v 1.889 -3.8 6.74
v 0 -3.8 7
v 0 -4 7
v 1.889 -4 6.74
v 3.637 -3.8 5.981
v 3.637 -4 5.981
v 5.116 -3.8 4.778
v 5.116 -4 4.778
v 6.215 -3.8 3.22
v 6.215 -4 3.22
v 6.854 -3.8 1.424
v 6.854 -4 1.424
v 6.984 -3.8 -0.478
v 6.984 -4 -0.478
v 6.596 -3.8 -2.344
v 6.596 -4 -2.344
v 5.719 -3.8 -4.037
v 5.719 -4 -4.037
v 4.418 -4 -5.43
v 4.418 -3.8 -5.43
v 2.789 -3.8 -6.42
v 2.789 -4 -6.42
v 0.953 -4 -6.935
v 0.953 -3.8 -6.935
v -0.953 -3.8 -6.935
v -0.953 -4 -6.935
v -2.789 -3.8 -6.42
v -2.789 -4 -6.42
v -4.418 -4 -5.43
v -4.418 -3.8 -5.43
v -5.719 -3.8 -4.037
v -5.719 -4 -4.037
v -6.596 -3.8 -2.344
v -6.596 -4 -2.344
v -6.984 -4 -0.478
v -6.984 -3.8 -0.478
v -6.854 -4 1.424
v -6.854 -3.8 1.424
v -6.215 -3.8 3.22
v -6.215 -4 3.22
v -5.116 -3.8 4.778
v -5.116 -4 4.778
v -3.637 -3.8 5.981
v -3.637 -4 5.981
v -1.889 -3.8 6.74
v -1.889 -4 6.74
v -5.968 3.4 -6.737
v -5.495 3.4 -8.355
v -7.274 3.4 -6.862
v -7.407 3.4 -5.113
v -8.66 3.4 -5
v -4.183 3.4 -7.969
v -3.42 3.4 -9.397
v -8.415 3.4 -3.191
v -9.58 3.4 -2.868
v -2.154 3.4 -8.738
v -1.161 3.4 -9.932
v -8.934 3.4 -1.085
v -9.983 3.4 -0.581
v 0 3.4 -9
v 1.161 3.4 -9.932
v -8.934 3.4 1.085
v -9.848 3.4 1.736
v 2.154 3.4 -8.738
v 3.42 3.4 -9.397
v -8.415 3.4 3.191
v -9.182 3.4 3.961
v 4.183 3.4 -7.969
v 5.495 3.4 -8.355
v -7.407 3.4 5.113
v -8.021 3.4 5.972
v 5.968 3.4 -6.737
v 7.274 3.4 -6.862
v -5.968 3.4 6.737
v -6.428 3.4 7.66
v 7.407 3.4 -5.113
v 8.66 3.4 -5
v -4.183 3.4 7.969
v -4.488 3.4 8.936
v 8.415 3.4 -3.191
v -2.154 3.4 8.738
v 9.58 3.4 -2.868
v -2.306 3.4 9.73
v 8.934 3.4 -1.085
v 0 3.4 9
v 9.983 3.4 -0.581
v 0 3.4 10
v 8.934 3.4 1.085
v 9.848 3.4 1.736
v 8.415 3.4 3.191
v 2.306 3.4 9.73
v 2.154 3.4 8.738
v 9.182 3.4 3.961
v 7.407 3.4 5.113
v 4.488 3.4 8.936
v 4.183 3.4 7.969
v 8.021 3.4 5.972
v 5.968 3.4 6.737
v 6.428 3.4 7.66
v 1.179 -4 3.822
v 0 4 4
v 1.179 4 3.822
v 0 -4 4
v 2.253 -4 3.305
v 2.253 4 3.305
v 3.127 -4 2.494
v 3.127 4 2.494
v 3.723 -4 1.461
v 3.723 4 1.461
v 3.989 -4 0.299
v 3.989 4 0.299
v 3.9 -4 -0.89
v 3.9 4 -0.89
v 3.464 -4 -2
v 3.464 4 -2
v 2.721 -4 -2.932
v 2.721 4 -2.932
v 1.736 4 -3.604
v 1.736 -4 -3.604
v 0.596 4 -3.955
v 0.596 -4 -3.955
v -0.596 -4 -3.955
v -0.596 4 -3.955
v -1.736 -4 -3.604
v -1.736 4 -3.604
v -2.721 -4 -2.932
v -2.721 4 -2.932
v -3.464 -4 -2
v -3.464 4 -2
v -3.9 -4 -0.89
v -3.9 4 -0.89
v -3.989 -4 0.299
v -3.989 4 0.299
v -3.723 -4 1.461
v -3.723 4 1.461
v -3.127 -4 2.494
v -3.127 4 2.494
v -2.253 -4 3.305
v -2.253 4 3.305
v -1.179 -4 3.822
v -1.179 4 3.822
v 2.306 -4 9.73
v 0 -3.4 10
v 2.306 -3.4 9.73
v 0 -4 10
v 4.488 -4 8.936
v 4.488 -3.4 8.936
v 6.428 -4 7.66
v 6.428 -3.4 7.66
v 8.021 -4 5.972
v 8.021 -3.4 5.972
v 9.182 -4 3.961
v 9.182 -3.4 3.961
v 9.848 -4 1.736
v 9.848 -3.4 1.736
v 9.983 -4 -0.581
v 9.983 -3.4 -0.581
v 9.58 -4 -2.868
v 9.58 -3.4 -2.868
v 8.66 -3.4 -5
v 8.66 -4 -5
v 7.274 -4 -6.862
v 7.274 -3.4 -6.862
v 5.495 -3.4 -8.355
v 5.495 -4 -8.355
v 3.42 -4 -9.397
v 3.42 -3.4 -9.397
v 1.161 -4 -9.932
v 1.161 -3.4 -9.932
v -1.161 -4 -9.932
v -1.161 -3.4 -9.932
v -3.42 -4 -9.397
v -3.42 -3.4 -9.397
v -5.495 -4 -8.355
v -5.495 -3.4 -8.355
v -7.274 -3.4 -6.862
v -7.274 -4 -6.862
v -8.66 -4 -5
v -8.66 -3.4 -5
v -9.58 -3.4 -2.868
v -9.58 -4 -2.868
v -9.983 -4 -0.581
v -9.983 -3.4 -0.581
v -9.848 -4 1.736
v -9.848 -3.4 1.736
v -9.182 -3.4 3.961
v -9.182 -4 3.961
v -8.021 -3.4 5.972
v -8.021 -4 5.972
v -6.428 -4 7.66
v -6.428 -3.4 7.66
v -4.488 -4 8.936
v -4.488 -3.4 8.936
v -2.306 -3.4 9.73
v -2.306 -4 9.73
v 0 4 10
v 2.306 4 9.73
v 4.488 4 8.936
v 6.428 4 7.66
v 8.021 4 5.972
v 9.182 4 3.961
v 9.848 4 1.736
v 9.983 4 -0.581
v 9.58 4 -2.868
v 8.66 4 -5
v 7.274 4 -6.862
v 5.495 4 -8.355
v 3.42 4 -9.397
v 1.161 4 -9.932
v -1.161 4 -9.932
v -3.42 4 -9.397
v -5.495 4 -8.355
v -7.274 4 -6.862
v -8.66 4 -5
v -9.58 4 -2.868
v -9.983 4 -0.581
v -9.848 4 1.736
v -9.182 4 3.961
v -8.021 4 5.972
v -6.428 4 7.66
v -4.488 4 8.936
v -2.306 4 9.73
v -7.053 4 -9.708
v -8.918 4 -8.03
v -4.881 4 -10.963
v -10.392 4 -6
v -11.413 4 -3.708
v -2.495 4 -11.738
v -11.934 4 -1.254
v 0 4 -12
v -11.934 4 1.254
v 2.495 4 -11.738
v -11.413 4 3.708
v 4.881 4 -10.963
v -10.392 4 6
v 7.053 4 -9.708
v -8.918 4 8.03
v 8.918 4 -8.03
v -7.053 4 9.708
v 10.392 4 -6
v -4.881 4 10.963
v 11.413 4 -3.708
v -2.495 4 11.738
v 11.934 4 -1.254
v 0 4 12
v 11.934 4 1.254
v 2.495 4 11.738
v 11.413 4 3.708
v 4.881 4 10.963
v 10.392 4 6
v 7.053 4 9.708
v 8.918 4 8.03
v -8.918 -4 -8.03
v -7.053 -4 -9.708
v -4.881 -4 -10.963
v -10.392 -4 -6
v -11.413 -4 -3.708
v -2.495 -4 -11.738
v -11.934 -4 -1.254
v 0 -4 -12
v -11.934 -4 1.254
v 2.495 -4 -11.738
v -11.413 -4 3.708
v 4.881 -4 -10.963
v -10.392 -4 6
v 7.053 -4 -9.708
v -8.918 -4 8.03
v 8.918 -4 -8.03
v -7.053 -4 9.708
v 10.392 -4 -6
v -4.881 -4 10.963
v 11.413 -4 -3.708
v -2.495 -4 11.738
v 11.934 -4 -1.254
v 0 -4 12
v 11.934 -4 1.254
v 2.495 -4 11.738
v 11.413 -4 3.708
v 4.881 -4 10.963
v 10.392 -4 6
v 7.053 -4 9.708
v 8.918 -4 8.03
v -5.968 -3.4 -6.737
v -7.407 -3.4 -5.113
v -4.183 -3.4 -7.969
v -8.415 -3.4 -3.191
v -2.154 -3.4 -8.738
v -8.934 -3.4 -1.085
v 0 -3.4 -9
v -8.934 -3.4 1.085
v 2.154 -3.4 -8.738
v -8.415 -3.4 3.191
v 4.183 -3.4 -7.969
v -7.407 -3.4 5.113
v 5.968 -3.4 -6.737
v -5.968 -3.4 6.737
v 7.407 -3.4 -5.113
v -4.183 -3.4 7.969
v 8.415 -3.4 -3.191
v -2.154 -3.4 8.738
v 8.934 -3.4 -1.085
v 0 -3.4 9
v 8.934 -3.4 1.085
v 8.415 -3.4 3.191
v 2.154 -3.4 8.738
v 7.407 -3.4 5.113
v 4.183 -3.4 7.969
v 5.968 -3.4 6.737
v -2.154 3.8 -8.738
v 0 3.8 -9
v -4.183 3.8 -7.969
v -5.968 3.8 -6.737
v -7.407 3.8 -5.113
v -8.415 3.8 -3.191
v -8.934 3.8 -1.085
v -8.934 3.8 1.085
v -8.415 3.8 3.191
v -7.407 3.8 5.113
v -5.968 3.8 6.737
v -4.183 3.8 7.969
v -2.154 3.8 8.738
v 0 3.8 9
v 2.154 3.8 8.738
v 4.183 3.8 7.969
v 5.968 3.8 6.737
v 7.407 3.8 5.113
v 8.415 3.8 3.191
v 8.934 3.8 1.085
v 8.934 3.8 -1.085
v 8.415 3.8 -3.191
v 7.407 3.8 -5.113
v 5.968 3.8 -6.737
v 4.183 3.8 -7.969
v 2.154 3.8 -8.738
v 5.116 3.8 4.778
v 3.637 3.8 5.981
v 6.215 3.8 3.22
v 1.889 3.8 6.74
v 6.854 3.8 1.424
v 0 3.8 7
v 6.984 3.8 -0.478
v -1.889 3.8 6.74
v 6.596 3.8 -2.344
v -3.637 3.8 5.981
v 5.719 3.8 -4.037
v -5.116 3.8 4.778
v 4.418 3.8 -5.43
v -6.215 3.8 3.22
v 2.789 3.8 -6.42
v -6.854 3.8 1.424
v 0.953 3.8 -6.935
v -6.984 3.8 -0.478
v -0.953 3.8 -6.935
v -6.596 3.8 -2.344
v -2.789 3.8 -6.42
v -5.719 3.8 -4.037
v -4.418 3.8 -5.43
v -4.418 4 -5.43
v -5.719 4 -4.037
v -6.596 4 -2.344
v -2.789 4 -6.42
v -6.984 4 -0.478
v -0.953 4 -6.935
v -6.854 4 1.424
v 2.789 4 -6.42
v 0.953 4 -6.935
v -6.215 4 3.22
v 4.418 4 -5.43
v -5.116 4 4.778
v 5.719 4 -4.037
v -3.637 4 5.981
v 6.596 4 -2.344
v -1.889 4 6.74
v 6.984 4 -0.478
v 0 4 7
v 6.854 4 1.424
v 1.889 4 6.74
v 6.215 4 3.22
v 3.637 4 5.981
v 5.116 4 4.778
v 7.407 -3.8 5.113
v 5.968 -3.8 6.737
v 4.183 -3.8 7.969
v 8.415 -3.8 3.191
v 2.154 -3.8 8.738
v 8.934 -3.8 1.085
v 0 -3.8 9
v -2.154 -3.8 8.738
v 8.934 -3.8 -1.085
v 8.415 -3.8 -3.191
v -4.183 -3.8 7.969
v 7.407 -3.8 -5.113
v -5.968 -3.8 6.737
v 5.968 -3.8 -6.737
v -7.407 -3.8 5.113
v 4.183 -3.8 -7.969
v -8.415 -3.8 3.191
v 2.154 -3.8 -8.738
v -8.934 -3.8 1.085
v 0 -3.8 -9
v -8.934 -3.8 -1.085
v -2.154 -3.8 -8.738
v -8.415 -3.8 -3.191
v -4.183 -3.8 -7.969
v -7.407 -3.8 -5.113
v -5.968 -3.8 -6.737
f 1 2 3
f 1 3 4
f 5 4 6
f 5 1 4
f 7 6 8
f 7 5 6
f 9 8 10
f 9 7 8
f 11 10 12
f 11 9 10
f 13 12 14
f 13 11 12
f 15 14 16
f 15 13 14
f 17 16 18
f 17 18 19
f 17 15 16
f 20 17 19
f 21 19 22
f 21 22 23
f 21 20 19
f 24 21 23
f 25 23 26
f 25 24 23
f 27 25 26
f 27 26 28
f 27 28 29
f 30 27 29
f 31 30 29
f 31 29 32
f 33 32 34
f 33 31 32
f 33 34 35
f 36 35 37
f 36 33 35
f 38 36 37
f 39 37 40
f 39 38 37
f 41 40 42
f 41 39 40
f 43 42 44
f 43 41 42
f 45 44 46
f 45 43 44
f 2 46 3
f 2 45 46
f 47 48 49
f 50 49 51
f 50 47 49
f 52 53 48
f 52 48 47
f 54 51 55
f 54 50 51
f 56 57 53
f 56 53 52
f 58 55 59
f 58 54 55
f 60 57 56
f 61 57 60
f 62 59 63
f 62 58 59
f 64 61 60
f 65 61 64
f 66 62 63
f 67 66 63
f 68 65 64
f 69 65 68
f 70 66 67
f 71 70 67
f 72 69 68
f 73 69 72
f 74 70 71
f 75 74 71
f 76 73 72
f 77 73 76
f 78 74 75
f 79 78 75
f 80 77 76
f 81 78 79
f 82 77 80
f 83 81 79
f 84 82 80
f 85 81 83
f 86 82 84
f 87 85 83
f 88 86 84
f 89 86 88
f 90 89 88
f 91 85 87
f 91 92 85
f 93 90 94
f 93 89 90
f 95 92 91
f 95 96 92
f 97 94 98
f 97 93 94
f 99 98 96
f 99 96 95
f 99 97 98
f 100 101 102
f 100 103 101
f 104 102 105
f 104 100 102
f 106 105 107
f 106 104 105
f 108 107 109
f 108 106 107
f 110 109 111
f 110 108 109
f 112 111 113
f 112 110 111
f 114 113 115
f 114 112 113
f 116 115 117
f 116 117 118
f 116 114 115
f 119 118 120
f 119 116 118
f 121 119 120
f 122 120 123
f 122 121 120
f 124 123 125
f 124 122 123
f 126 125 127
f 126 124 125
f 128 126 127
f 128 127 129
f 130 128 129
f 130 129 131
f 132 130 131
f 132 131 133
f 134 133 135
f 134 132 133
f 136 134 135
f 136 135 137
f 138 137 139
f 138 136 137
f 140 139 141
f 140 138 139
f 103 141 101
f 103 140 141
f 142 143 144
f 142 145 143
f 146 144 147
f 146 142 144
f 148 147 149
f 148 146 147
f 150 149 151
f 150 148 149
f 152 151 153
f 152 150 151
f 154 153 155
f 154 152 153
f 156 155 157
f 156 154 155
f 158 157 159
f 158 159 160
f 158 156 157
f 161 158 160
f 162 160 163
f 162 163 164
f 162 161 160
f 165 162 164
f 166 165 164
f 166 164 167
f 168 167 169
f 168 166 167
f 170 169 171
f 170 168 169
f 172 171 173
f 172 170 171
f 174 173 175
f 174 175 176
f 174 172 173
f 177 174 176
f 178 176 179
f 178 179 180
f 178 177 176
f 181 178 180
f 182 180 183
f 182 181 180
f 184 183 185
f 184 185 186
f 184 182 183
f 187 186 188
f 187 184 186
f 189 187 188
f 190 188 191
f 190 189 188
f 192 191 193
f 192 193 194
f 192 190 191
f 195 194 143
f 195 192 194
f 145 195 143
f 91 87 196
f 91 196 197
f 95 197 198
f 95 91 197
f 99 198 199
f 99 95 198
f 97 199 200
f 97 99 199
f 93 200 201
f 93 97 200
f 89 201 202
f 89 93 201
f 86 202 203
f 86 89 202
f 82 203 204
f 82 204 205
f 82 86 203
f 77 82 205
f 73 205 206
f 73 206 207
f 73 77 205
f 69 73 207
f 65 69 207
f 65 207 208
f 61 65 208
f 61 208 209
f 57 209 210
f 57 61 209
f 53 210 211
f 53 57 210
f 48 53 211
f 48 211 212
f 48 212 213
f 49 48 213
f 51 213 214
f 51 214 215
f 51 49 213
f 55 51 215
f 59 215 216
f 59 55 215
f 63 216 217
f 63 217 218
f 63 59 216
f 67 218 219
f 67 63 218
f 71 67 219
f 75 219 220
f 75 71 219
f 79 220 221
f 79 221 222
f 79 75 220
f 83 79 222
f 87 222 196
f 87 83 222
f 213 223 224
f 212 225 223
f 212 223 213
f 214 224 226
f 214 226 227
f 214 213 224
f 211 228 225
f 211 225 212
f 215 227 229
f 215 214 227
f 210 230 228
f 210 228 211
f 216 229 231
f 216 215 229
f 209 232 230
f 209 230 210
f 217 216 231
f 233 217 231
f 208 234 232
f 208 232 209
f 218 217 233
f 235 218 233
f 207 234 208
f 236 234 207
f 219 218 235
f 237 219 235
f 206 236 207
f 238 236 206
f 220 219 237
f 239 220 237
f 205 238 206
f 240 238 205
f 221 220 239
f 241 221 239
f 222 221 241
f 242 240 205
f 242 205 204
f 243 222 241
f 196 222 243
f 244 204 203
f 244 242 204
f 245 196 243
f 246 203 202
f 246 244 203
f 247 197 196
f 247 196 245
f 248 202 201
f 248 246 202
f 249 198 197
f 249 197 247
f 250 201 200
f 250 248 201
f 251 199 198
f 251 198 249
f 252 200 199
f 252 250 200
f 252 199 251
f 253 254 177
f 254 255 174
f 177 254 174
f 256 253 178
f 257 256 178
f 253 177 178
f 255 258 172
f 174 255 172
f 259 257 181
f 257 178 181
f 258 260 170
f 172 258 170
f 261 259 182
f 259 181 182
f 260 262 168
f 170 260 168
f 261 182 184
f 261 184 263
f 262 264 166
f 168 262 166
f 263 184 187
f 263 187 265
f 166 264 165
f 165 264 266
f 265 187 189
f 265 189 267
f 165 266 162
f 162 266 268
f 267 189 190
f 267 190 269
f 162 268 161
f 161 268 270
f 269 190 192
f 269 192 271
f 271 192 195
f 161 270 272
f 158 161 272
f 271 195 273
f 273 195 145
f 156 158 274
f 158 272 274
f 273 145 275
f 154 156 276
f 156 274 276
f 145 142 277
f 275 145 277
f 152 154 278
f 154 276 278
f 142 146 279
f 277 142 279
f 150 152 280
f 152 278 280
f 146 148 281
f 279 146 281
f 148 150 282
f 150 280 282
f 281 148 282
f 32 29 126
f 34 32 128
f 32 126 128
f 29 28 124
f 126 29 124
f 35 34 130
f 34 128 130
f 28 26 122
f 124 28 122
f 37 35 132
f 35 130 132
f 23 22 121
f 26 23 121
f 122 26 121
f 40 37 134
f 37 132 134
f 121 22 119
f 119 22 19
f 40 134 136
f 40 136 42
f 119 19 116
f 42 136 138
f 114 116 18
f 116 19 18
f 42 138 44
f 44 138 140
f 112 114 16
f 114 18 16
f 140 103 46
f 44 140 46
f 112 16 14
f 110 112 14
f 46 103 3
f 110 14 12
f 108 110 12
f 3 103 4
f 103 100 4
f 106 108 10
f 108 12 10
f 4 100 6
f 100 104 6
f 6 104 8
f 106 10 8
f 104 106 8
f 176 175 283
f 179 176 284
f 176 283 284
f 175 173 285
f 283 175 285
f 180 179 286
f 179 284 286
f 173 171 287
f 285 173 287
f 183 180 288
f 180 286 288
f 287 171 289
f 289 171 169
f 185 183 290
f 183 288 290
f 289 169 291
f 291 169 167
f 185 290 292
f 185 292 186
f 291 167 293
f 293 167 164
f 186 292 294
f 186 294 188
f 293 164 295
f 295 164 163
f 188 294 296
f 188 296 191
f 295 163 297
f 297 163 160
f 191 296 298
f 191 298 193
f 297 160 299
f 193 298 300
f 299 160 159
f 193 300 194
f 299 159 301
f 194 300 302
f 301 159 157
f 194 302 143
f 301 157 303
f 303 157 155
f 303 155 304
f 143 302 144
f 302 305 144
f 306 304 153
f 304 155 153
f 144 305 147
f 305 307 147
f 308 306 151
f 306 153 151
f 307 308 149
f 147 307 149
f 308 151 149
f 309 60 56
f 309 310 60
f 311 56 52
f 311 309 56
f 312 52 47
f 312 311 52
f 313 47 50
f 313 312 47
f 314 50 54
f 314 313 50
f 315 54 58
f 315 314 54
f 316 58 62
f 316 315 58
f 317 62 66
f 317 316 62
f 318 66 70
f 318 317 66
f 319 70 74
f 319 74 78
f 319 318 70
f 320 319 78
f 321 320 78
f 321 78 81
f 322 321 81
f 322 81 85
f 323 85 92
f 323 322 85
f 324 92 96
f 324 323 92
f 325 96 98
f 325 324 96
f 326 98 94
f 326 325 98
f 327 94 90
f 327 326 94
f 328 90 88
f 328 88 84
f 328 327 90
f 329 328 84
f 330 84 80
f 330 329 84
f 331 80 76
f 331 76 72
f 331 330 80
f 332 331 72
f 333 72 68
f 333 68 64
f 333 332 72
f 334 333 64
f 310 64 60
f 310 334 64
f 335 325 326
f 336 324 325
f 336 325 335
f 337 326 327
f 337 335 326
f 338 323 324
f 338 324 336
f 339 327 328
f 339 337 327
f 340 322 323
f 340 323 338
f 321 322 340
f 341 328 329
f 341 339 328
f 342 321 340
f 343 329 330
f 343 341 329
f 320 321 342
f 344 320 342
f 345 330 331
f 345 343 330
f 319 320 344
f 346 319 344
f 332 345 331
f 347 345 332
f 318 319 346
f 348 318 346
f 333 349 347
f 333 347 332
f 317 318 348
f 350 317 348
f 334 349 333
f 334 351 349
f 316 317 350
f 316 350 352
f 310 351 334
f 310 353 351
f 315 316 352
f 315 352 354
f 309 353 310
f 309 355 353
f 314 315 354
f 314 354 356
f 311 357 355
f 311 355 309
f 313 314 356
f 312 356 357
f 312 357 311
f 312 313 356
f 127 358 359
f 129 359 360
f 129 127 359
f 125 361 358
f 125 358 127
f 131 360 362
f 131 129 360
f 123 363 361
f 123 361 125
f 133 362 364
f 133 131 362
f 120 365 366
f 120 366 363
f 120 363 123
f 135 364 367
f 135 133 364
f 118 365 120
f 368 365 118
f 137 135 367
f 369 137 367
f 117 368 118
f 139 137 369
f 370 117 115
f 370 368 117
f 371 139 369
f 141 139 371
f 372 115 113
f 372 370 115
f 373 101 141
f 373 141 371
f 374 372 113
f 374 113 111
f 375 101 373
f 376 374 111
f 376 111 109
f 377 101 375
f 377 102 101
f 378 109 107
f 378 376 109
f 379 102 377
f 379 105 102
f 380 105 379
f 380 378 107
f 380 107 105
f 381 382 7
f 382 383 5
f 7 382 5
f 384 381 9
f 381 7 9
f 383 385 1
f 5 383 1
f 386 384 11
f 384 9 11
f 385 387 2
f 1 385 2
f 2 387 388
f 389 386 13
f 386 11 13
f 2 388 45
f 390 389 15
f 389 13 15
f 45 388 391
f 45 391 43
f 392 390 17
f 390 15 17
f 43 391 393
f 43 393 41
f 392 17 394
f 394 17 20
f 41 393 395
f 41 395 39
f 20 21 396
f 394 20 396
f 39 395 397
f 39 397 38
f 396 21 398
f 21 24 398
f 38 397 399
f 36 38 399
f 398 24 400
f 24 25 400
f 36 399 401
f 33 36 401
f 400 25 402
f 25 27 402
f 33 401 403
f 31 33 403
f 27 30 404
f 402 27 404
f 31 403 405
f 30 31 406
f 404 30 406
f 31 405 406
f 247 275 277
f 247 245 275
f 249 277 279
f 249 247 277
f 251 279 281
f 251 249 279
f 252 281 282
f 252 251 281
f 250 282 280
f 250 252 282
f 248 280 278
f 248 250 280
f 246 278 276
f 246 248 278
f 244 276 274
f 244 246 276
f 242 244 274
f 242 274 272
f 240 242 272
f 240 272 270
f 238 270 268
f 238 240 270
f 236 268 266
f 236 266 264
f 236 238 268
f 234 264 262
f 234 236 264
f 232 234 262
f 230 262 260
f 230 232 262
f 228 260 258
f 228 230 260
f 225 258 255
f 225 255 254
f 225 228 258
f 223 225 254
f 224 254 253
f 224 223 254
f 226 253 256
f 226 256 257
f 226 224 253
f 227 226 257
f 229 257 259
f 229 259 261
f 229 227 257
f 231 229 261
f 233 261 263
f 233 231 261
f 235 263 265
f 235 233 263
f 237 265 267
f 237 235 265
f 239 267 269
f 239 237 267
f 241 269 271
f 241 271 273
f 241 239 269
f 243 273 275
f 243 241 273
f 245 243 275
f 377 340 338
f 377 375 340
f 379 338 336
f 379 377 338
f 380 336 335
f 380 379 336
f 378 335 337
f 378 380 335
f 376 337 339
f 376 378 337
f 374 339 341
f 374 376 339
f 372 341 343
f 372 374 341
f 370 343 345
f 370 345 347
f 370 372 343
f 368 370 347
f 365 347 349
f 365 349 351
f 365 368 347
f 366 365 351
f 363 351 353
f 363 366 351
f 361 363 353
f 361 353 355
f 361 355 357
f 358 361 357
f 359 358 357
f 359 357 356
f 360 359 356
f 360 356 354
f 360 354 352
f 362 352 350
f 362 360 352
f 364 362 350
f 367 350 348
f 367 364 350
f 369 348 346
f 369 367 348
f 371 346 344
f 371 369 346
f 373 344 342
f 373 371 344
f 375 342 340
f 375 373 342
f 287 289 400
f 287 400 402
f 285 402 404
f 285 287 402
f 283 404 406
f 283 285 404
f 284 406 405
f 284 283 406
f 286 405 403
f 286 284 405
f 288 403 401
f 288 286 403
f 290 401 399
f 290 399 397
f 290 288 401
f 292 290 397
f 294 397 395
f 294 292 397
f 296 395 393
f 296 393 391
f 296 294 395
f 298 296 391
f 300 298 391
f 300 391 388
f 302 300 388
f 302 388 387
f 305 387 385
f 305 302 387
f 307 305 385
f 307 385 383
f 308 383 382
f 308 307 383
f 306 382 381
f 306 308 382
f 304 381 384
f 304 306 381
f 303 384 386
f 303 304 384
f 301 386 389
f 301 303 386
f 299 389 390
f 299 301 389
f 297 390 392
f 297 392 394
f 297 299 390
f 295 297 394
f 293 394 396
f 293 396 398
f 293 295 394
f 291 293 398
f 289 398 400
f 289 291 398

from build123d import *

# Parameters (mm, degrees)
SKETCH1_R           = 7
SKETCH1_R_2         = 4
BOSS_EXTRUDE1_DEPTH = 4
SKETCH3_R           = 9
SKETCH3_R_2         = 7
BOSS_EXTRUDE2_DEPTH = 3.8
SKETCH4_R           = 10
SKETCH4_R_2         = 9
BOSS_EXTRUDE3_DEPTH = 3.4
SKETCH5_R           = 12
SKETCH5_R_2         = 10
BOSS_EXTRUDE4_DEPTH = 4


with BuildPart() as part:
    # Sketch1 → Boss-Extrude1 (new, symmetric)
    with BuildSketch(Plane(origin=(0, 0, 0), x_dir=(1, 0, 0), z_dir=(0, 1, 0))):
        with Locations(Location((0, 0, 0), (0, 0, 270))):
            Circle(SKETCH1_R)
        with Locations(Location((0, 0, 0), (0, 0, 270))):
            Circle(SKETCH1_R_2, mode=Mode.SUBTRACT)
    extrude(amount=BOSS_EXTRUDE1_DEPTH, both=True)

    # Sketch3 → Boss-Extrude2 (add, symmetric)
    with BuildSketch(Plane(origin=(0, 0, 0), x_dir=(1, 0, 0), z_dir=(0, 1, 0))):
        with Locations(Location((0, 0, 0), (0, 0, 90))):
            Circle(SKETCH3_R)
        with Locations(Location((0, 0, 0), (0, 0, 270))):
            Circle(SKETCH3_R_2, mode=Mode.SUBTRACT)
    extrude(amount=BOSS_EXTRUDE2_DEPTH, both=True)

    # Sketch4 → Boss-Extrude3 (add, symmetric)
    with BuildSketch(Plane(origin=(0, 0, 0), x_dir=(1, 0, 0), z_dir=(0, 1, 0))):
        with Locations(Location((0, 0, 0), (0, 0, 270))):
            Circle(SKETCH4_R)
        with Locations(Location((0, 0, 0), (0, 0, 90))):
            Circle(SKETCH4_R_2, mode=Mode.SUBTRACT)
    extrude(amount=BOSS_EXTRUDE3_DEPTH, both=True)

    # Sketch5 → Boss-Extrude4 (add, symmetric)
    with BuildSketch(Plane(origin=(0, 0, 0), x_dir=(1, 0, 0), z_dir=(0, 1, 0))):
        with Locations(Location((0, 0, 0), (0, 0, 270))):
            Circle(SKETCH5_R)
        with Locations(Location((0, 0, 0), (0, 0, 270))):
            Circle(SKETCH5_R_2, mode=Mode.SUBTRACT)
    extrude(amount=BOSS_EXTRUDE4_DEPTH, both=True)


solid = part.part
